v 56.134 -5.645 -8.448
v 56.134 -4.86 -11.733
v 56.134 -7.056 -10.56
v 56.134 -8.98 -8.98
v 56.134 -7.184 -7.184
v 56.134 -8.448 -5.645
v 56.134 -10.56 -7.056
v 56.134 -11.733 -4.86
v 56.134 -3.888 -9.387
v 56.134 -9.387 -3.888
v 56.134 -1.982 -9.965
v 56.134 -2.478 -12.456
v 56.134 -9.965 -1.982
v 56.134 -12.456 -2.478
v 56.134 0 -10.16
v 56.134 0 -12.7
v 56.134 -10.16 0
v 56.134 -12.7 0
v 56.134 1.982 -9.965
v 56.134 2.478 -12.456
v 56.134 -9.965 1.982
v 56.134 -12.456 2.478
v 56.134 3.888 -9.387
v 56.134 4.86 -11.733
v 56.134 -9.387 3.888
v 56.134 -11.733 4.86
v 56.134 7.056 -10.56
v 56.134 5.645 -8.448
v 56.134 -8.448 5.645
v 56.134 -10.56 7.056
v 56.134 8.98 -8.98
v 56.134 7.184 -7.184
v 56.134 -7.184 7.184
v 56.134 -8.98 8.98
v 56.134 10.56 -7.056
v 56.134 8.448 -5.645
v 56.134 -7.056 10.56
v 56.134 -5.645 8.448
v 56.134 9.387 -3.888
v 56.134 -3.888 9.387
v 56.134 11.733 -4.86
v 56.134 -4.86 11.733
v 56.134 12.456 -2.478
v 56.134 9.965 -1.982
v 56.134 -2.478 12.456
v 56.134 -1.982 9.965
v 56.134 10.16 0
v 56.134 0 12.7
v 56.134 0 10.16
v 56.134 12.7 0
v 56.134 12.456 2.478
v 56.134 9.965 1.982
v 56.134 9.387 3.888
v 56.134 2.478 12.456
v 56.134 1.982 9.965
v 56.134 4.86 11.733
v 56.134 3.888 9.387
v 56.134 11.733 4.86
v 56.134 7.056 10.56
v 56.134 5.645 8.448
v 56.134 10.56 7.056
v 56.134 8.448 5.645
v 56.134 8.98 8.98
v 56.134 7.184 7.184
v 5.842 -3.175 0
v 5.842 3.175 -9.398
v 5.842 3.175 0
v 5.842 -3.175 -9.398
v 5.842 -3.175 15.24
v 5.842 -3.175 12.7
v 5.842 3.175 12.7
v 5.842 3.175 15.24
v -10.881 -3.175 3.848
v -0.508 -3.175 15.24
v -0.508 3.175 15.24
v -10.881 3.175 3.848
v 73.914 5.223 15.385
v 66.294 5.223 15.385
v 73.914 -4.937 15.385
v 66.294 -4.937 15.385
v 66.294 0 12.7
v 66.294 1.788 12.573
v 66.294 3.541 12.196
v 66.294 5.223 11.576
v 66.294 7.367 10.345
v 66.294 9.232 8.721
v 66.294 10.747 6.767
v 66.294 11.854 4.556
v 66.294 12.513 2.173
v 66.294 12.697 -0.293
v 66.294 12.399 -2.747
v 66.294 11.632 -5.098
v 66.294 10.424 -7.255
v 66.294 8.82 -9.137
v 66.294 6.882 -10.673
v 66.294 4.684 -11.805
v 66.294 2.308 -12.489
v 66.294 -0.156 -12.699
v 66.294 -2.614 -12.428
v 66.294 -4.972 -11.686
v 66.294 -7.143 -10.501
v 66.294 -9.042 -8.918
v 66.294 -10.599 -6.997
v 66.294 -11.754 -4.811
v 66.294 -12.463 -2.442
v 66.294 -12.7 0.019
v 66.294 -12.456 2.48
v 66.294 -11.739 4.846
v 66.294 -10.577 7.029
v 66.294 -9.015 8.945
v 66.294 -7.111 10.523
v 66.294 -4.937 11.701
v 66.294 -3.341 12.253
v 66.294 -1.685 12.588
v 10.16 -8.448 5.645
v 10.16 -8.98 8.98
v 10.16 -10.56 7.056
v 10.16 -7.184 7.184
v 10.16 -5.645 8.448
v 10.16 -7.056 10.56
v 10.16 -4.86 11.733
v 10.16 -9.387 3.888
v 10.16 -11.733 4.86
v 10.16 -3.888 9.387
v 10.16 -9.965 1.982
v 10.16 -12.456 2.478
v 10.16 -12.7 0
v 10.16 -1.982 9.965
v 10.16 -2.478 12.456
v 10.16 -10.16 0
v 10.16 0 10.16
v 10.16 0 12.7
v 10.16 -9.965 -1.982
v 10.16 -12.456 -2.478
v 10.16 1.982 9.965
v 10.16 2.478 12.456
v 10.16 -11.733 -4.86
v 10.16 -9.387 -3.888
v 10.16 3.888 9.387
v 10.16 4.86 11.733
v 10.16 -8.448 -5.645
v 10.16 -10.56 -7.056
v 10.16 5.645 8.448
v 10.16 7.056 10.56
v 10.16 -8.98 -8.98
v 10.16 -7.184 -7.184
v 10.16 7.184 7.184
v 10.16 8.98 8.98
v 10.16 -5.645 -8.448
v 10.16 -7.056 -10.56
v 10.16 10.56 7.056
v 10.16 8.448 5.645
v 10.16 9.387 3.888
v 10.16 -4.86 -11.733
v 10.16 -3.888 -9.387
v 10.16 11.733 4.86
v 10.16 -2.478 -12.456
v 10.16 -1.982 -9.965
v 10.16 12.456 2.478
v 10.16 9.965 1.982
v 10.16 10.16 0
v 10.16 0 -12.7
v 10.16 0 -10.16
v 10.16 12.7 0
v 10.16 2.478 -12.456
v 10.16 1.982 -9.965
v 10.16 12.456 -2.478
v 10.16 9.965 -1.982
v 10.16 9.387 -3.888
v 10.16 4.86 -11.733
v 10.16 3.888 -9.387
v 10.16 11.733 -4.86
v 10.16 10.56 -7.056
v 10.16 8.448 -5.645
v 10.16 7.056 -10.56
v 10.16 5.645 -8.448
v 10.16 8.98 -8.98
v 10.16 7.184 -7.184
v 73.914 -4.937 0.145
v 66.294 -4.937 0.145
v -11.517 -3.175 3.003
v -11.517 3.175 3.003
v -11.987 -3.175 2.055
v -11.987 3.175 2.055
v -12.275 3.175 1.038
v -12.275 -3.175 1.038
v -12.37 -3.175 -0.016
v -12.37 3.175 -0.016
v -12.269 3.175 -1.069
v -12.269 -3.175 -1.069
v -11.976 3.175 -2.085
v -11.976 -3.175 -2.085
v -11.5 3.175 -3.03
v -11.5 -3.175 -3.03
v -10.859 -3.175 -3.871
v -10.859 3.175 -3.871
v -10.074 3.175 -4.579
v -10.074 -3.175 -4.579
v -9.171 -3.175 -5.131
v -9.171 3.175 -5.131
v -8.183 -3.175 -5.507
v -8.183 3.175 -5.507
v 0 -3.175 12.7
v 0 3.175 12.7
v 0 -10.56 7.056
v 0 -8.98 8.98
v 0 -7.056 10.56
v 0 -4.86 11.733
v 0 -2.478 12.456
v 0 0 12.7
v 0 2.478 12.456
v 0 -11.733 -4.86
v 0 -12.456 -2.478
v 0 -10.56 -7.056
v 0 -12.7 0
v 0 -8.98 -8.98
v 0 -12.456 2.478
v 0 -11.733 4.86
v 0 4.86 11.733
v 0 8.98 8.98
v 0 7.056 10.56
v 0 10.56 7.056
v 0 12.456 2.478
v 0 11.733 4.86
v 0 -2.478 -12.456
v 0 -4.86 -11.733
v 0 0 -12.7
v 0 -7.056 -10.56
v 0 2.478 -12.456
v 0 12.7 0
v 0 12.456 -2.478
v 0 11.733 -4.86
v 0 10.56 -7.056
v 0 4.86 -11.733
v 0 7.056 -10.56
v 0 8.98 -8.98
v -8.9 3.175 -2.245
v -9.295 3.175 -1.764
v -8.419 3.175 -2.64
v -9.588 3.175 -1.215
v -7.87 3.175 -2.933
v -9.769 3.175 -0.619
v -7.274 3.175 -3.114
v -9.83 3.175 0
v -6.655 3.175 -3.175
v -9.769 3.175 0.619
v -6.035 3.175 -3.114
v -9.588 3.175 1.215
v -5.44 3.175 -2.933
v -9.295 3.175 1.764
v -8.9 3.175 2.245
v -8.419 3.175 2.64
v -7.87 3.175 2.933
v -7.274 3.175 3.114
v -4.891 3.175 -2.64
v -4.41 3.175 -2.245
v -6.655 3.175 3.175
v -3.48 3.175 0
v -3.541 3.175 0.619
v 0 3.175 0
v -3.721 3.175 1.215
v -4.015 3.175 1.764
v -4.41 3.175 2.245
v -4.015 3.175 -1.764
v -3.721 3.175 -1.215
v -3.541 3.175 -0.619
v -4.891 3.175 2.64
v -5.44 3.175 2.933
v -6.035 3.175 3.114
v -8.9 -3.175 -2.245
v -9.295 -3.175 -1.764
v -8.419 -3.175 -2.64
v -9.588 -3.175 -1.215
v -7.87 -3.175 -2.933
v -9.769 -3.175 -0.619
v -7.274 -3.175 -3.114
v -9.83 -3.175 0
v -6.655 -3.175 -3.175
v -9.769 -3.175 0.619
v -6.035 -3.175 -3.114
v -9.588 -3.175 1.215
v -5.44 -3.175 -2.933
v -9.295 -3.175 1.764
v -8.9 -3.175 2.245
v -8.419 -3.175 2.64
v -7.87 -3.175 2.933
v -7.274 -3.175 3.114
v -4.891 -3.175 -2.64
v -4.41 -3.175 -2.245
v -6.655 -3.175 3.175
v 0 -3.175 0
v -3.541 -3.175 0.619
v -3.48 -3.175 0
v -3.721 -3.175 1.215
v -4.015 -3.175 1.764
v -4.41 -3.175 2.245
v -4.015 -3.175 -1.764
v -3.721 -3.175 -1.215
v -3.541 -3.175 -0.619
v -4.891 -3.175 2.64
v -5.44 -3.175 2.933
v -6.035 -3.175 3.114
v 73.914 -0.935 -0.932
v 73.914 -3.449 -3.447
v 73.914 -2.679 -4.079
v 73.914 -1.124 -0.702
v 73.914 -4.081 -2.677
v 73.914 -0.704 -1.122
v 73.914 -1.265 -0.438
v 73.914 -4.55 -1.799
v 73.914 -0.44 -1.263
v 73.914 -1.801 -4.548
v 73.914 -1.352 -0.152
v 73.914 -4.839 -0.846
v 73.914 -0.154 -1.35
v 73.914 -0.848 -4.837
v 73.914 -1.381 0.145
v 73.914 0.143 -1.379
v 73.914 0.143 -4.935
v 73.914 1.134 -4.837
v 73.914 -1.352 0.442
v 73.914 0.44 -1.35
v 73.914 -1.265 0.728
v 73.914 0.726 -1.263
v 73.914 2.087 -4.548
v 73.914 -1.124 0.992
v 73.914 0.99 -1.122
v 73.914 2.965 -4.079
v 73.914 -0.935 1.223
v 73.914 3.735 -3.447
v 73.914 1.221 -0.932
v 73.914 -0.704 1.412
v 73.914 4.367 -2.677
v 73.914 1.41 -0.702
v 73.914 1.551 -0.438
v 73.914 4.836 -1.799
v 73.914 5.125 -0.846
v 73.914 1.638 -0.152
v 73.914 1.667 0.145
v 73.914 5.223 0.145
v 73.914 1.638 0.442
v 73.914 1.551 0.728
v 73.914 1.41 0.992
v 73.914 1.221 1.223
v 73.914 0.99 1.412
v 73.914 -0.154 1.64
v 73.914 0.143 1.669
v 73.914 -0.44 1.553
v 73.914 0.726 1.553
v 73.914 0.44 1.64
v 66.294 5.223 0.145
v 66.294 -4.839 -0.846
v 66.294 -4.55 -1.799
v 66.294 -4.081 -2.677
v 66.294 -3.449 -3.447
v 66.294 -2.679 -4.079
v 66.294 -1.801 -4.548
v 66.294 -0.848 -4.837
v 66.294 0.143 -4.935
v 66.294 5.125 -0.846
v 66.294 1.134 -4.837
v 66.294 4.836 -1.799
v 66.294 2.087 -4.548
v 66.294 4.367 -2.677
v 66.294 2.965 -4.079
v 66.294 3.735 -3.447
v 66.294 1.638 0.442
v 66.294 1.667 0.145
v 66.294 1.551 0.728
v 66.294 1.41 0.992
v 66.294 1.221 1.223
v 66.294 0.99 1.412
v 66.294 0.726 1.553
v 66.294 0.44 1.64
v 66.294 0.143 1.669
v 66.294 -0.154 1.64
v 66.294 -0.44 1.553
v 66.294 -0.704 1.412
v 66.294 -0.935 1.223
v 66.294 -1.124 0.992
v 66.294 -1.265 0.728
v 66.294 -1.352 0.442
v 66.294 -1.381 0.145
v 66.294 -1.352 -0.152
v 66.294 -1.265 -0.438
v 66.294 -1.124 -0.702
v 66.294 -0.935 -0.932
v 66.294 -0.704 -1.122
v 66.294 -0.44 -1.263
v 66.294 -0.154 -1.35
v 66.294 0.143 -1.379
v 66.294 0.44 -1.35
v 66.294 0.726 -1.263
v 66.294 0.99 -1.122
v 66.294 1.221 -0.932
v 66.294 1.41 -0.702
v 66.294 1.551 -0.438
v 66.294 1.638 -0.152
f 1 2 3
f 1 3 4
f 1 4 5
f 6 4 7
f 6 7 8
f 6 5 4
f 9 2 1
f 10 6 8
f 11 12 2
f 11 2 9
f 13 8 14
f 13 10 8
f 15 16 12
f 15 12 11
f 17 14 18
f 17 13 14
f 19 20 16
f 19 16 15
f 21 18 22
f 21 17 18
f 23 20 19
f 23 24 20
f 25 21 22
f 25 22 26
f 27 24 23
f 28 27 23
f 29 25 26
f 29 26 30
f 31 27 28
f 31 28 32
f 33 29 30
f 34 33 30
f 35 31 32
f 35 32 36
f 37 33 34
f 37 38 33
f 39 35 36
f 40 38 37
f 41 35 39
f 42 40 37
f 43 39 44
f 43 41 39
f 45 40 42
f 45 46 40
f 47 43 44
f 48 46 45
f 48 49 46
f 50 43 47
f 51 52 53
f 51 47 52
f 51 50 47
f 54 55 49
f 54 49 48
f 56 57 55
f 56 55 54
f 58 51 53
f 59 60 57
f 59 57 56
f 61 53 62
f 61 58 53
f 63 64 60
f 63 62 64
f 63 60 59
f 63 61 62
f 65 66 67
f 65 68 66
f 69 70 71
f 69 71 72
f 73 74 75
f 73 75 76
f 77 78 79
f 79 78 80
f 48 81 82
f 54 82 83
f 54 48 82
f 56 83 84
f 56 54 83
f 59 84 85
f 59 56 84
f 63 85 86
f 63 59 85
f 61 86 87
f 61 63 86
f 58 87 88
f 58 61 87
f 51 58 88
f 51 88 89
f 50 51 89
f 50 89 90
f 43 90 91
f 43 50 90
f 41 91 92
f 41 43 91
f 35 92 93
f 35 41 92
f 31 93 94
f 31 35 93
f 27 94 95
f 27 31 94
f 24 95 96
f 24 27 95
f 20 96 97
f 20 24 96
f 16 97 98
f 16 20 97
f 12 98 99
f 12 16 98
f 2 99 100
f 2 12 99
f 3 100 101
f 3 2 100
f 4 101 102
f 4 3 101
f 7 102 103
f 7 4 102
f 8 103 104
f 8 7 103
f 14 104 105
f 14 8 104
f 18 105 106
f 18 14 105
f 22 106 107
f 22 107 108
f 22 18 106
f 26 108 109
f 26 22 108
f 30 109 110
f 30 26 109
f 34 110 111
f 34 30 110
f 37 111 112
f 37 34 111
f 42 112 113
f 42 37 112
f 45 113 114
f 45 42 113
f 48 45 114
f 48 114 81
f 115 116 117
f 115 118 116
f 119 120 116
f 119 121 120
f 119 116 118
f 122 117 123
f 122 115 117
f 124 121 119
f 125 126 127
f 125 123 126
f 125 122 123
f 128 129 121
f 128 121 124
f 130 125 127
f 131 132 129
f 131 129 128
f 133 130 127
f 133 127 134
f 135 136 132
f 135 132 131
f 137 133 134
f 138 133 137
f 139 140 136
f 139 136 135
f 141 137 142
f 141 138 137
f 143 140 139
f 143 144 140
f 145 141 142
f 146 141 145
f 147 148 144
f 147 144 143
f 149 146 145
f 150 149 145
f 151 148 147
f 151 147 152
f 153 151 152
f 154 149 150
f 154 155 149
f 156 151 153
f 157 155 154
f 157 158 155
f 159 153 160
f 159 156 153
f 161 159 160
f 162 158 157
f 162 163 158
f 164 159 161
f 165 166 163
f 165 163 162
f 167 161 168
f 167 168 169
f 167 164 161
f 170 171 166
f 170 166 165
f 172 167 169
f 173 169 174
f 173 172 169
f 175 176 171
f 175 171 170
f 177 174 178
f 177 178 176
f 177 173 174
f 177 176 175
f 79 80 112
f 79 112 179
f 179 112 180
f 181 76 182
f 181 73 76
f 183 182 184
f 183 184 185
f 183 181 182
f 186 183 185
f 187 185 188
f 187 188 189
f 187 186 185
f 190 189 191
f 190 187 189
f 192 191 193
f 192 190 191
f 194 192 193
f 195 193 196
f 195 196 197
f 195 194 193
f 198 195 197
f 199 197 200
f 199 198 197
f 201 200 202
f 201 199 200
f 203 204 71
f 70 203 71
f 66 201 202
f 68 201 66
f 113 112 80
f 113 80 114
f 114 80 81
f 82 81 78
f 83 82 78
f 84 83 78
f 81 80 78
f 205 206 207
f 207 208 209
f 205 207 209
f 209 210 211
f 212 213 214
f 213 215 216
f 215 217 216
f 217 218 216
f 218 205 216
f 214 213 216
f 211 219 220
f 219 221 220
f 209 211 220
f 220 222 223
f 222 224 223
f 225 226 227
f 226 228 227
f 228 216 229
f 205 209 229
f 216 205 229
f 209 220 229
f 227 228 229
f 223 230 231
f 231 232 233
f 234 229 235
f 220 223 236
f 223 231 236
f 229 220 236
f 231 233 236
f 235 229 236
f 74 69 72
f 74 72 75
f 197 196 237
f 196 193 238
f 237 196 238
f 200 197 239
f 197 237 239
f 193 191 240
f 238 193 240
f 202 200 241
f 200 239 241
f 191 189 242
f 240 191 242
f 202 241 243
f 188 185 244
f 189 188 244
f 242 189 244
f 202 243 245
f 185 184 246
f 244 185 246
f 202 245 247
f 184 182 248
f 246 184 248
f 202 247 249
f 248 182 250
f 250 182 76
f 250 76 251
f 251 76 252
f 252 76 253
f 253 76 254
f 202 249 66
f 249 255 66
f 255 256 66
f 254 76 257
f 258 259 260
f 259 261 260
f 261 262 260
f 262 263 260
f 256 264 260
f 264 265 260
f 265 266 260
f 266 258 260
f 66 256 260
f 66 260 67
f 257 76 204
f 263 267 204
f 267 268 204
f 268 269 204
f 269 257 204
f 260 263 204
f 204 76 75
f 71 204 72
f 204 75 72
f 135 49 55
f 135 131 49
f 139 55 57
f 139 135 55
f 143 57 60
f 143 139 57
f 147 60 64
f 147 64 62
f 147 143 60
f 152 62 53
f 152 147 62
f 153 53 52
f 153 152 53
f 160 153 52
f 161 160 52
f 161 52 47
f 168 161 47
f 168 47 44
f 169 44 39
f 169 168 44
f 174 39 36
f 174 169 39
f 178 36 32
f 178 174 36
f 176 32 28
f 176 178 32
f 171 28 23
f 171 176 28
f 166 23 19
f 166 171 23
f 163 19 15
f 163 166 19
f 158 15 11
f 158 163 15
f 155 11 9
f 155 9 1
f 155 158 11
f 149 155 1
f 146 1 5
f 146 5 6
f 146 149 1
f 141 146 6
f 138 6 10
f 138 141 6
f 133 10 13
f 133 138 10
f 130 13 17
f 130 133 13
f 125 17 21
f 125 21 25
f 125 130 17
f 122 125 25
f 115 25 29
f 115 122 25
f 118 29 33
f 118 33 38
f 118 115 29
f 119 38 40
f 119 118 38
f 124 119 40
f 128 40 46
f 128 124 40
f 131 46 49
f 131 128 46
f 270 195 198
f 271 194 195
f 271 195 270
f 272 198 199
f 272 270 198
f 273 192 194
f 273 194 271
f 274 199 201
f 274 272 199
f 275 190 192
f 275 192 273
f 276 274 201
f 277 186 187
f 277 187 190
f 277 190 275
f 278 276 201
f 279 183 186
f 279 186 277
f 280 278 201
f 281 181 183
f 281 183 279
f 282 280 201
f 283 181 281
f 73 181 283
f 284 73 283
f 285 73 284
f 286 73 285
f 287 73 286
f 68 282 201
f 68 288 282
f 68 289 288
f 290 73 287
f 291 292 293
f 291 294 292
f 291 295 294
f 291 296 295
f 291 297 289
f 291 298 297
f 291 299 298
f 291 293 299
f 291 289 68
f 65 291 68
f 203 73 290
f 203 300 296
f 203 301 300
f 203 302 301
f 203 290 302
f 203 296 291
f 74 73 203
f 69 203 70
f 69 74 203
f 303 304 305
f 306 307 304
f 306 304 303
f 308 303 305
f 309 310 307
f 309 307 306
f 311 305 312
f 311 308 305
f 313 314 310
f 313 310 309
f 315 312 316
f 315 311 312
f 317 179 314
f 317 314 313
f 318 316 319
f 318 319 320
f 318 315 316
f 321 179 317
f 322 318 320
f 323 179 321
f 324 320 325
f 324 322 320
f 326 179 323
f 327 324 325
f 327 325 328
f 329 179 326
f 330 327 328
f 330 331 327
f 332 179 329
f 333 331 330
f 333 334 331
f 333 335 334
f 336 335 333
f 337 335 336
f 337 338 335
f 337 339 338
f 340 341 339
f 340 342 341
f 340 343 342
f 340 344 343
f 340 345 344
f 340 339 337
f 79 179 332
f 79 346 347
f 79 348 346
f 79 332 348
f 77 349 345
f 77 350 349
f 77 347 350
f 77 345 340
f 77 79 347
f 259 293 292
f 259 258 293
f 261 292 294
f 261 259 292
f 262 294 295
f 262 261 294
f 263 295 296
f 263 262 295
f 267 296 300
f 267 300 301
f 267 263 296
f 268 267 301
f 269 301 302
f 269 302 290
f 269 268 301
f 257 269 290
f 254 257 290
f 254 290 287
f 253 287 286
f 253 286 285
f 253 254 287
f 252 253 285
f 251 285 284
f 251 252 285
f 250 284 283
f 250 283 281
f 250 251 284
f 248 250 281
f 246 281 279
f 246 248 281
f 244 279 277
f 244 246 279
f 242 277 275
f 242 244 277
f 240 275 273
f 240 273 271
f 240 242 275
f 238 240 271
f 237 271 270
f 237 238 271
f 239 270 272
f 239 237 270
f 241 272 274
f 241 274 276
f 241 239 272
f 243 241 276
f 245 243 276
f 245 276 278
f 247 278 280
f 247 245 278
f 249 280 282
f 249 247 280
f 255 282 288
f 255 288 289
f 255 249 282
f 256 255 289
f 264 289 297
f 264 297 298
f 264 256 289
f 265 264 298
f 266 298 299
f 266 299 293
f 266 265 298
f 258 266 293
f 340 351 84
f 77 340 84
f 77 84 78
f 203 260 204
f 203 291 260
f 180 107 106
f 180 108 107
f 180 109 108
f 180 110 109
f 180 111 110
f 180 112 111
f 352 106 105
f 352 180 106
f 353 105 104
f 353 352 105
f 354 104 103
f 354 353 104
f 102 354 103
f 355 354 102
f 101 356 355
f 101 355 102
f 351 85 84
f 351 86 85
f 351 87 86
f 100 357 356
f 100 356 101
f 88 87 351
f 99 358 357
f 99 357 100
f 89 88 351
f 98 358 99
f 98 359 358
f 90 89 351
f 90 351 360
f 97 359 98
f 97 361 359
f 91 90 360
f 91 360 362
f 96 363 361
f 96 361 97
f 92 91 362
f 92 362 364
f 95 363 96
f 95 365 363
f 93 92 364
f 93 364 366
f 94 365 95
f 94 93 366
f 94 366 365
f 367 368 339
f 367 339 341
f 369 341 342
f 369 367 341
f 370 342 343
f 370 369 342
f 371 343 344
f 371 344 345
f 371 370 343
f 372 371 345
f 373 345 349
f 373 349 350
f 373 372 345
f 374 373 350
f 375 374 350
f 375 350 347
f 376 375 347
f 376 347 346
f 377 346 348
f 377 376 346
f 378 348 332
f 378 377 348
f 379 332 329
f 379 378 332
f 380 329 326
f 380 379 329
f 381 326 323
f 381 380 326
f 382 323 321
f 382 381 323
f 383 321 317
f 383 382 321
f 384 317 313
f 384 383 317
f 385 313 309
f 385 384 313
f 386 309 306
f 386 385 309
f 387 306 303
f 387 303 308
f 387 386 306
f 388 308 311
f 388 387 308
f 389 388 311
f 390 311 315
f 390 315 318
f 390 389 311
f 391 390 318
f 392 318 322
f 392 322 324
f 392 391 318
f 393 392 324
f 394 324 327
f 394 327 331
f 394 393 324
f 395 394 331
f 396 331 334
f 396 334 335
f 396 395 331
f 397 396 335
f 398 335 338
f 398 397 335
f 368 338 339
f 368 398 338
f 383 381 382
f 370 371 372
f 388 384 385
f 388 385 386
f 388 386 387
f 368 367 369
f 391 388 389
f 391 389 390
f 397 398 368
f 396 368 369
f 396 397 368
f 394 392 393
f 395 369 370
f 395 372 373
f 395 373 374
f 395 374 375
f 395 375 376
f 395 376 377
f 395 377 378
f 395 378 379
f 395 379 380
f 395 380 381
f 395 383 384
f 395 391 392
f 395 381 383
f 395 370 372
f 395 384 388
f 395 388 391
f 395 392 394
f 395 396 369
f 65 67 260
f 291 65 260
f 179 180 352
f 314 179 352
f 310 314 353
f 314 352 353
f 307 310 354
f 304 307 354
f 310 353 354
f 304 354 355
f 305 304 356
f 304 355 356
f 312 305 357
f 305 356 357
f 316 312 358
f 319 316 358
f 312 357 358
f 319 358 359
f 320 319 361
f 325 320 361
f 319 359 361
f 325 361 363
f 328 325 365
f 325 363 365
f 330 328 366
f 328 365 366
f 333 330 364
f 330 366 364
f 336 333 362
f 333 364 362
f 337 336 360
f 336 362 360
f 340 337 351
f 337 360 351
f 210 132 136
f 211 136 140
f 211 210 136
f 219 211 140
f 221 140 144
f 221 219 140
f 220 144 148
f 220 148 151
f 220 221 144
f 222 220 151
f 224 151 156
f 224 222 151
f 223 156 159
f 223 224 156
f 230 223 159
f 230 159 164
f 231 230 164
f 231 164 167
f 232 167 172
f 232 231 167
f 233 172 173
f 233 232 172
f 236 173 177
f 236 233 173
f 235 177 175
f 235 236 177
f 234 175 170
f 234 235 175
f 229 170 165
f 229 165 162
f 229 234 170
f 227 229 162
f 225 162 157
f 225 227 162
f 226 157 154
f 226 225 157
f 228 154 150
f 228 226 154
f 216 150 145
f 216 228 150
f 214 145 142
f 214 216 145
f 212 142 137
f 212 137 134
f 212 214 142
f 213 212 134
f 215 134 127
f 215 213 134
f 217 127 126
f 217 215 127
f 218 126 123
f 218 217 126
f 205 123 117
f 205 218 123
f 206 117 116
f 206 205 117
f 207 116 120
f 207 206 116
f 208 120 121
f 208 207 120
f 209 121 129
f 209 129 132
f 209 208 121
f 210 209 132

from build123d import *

# Parameters (mm, degrees)
F0_W     = 5.842
F0_H     = 12.7
F0_R     = 3.175
F2_DEPTH = 3.175
F3_R     = 1.524
F4_DEPTH = 7.62


with BuildPart() as f1:
    # F0 (on Front) → F1 (revolve)
    with BuildSketch(Plane.XZ):
        with Locations((2.921, 6.35)):
            Rectangle(F0_W, F0_H)
        Polygon((5.842, 12.7), (5.842, 0), (66.294, 0), (66.294, 12.7), (56.134, 12.7), (56.134, 10.16), (10.16, 10.16), (10.16, 12.7), align=None)
    revolve(axis=Axis((33.147, 0, 0), (-1, 0, 0)))

    # F3 (on face) → F4 (join)
    with BuildSketch(Plane.YZ.offset(66.294)):
        with BuildLine():
            ThreePointArc((-4.9370855387, 11.7010762917), (0.1559347004, 12.6990426556), (5.2229144613, 11.576319127))
            Line((5.2229144613, 11.576319127), (5.2229144613, 15.3851687422))
            Line((5.2229144613, 15.3851687422), (-4.9370855387, 15.3851687422))
            Line((-4.9370855387, 15.3851687422), (-4.9370855387, 11.7010762917))
        make_face()
        with BuildLine():
            ThreePointArc((-4.9370855387, 0.1451687422), (0.1429144613, 5.2251687422), (5.2229144613, 0.1451687422))
            Line((5.2229144613, 0.1451687422), (5.2229144613, 11.576319127))
            ThreePointArc((5.2229144613, 11.576319127), (0.1559347004, 12.6990426556), (-4.9370855387, 11.7010762917))
            Line((-4.9370855387, 11.7010762917), (-4.9370855387, 0.1451687422))
        make_face()
        with BuildLine():
            ThreePointArc((-4.9370855387, 0.1451687422), (0.1429144613, -4.9348312578), (5.2229144613, 0.1451687422))
            ThreePointArc((5.2229144613, 0.1451687422), (0.1429144613, 5.2251687422), (-4.9370855387, 0.1451687422))
        make_face()
        with Locations((0.1429144613, 0.1451687422)):
            Circle(F3_R, mode=Mode.SUBTRACT)
    extrude(amount=F4_DEPTH)


with BuildPart() as f2:
    # F0 (on Front) → F2 (new body, symmetric)
    with BuildSketch(Plane.XZ):
        with BuildLine():
            Line((-0.9398, 0), (0, 0))
            Line((0, 0), (0, 12.7))
            Line((0, 12.7), (5.842, 12.7))
            Line((5.842, 12.7), (5.842, 15.24))
            Line((5.842, 15.24), (-0.508, 15.24))
            Line((-0.508, 15.24), (-10.8806298187, 3.8475430269))
            ThreePointArc((-10.8806298187, 3.8475430269), (-4.5919612295, 5.3297205562), (-0.9398, 0))
        make_face()
        with BuildLine():
            Line((5.842, 0), (0, 0))
            Line((0, 0), (-0.9398, 0))
            ThreePointArc((-0.9398, 0), (-3.1957909266, -4.5493385486), (-8.1826630726, -5.5069827884))
            Line((-8.1826630726, -5.5069827884), (5.842, -9.398))
            Line((5.842, -9.398), (5.842, 0))
        make_face()
        with BuildLine():
            ThreePointArc((-8.1826630726, -5.5069827884), (-3.1957909266, -4.5493385486), (-0.9398, 0))
            ThreePointArc((-0.9398, 0), (-4.5919612295, 5.3297205562), (-10.8806298187, 3.8475430269))
            ThreePointArc((-10.8806298187, 3.8475430269), (-12.1459778134, -1.5837270034), (-8.1826630726, -5.5069827884))
        make_face()
        with Locations((-6.6548, 0)):
            Circle(F0_R, mode=Mode.SUBTRACT)
    extrude(amount=F2_DEPTH, both=True)


solid = Compound([f1.part, f2.part])
